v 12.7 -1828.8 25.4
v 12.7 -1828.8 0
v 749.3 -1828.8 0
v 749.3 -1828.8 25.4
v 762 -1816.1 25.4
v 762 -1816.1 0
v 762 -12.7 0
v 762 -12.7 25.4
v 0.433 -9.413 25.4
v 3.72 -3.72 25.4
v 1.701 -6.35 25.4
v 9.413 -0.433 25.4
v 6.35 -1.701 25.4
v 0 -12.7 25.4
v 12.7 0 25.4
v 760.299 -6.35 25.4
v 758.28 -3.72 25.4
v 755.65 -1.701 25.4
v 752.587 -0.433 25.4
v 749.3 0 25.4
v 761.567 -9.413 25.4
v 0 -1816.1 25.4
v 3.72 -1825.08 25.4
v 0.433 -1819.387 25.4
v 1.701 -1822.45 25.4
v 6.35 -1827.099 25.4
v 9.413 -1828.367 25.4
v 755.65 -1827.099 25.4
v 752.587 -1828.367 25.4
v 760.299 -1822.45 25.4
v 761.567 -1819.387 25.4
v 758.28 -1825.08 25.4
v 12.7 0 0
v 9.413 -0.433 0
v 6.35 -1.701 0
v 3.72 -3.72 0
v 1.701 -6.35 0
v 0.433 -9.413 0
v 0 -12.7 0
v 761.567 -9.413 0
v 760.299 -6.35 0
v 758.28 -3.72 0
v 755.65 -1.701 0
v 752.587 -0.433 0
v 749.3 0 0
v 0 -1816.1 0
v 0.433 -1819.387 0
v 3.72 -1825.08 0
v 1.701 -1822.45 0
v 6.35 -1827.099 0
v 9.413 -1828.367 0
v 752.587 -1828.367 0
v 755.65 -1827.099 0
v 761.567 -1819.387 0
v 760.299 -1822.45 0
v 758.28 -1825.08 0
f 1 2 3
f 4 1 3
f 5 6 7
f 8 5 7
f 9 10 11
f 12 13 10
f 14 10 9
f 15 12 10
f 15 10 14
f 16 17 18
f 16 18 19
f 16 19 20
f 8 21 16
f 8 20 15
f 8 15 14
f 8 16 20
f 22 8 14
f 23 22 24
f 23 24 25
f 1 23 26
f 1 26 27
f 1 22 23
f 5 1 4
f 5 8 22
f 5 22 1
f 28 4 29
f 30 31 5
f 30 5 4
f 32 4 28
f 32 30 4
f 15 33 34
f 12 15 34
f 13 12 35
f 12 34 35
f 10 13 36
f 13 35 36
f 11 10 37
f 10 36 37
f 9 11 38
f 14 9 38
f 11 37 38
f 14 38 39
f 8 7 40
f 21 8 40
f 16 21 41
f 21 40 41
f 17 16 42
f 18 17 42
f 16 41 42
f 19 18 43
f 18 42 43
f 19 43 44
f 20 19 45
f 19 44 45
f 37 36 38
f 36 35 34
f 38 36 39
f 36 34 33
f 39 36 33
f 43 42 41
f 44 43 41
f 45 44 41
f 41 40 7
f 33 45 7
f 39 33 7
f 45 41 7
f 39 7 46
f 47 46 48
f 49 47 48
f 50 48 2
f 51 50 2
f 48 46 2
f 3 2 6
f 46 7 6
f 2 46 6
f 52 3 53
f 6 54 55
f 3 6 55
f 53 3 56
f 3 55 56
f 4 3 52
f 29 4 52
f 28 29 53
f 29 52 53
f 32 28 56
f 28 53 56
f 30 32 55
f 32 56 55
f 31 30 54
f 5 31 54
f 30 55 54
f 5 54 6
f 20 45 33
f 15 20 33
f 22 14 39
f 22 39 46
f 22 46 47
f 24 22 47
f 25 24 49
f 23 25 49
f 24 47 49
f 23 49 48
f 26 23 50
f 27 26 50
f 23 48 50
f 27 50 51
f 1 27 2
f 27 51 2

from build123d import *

# Parameters (mm, degrees)
F1_DEPTH  = 25.4
F3_W      = 1803.4
F3_H      = 25.4
F4_DEPTH  = 3.175
F4_FACE_W = 1803.4
F4_FACE_H = 25.4
F5_DEPTH  = 3.175


with BuildPart() as f1:
    # F0 (on Top) → F1 (new body)
    with BuildSketch(Plane.XY):
        with BuildLine():
            Line((749.3, 0), (12.7, 0))
            ThreePointArc((12.7, 0), (3.719744, -3.719744), (0, -12.7))
            Line((0, -12.7), (0, -1816.1))
            ThreePointArc((0, -1816.1), (3.719744, -1825.080256), (12.7, -1828.8))
            Line((12.7, -1828.8), (749.3, -1828.8))
            ThreePointArc((749.3, -1828.8), (758.280256, -1825.080256), (762, -1816.1))
            Line((762, -1816.1), (762, -12.7))
            ThreePointArc((762, -12.7), (758.280256, -3.719744), (749.3, 0))
        make_face()
    extrude(amount=F1_DEPTH)

    # F3 (on face) → F4 (join)
    with BuildSketch(Plane(origin=(0, 0, 0), x_dir=(0, -1, 0), z_dir=(-1, 0, 0))):
        with Locations((914.4, 12.7)):
            Rectangle(F3_W, F3_H)
    extrude(amount=F4_DEPTH)

    # F4_face (on face) → F5 (cut)
    with BuildSketch(Plane(origin=(-3.175, -914.4, 12.7), x_dir=(0, -1, 0), z_dir=(-1, 0, 0))):
        Rectangle(F4_FACE_W, F4_FACE_H)
    extrude(amount=-F5_DEPTH, mode=Mode.SUBTRACT)


solid = f1.part
